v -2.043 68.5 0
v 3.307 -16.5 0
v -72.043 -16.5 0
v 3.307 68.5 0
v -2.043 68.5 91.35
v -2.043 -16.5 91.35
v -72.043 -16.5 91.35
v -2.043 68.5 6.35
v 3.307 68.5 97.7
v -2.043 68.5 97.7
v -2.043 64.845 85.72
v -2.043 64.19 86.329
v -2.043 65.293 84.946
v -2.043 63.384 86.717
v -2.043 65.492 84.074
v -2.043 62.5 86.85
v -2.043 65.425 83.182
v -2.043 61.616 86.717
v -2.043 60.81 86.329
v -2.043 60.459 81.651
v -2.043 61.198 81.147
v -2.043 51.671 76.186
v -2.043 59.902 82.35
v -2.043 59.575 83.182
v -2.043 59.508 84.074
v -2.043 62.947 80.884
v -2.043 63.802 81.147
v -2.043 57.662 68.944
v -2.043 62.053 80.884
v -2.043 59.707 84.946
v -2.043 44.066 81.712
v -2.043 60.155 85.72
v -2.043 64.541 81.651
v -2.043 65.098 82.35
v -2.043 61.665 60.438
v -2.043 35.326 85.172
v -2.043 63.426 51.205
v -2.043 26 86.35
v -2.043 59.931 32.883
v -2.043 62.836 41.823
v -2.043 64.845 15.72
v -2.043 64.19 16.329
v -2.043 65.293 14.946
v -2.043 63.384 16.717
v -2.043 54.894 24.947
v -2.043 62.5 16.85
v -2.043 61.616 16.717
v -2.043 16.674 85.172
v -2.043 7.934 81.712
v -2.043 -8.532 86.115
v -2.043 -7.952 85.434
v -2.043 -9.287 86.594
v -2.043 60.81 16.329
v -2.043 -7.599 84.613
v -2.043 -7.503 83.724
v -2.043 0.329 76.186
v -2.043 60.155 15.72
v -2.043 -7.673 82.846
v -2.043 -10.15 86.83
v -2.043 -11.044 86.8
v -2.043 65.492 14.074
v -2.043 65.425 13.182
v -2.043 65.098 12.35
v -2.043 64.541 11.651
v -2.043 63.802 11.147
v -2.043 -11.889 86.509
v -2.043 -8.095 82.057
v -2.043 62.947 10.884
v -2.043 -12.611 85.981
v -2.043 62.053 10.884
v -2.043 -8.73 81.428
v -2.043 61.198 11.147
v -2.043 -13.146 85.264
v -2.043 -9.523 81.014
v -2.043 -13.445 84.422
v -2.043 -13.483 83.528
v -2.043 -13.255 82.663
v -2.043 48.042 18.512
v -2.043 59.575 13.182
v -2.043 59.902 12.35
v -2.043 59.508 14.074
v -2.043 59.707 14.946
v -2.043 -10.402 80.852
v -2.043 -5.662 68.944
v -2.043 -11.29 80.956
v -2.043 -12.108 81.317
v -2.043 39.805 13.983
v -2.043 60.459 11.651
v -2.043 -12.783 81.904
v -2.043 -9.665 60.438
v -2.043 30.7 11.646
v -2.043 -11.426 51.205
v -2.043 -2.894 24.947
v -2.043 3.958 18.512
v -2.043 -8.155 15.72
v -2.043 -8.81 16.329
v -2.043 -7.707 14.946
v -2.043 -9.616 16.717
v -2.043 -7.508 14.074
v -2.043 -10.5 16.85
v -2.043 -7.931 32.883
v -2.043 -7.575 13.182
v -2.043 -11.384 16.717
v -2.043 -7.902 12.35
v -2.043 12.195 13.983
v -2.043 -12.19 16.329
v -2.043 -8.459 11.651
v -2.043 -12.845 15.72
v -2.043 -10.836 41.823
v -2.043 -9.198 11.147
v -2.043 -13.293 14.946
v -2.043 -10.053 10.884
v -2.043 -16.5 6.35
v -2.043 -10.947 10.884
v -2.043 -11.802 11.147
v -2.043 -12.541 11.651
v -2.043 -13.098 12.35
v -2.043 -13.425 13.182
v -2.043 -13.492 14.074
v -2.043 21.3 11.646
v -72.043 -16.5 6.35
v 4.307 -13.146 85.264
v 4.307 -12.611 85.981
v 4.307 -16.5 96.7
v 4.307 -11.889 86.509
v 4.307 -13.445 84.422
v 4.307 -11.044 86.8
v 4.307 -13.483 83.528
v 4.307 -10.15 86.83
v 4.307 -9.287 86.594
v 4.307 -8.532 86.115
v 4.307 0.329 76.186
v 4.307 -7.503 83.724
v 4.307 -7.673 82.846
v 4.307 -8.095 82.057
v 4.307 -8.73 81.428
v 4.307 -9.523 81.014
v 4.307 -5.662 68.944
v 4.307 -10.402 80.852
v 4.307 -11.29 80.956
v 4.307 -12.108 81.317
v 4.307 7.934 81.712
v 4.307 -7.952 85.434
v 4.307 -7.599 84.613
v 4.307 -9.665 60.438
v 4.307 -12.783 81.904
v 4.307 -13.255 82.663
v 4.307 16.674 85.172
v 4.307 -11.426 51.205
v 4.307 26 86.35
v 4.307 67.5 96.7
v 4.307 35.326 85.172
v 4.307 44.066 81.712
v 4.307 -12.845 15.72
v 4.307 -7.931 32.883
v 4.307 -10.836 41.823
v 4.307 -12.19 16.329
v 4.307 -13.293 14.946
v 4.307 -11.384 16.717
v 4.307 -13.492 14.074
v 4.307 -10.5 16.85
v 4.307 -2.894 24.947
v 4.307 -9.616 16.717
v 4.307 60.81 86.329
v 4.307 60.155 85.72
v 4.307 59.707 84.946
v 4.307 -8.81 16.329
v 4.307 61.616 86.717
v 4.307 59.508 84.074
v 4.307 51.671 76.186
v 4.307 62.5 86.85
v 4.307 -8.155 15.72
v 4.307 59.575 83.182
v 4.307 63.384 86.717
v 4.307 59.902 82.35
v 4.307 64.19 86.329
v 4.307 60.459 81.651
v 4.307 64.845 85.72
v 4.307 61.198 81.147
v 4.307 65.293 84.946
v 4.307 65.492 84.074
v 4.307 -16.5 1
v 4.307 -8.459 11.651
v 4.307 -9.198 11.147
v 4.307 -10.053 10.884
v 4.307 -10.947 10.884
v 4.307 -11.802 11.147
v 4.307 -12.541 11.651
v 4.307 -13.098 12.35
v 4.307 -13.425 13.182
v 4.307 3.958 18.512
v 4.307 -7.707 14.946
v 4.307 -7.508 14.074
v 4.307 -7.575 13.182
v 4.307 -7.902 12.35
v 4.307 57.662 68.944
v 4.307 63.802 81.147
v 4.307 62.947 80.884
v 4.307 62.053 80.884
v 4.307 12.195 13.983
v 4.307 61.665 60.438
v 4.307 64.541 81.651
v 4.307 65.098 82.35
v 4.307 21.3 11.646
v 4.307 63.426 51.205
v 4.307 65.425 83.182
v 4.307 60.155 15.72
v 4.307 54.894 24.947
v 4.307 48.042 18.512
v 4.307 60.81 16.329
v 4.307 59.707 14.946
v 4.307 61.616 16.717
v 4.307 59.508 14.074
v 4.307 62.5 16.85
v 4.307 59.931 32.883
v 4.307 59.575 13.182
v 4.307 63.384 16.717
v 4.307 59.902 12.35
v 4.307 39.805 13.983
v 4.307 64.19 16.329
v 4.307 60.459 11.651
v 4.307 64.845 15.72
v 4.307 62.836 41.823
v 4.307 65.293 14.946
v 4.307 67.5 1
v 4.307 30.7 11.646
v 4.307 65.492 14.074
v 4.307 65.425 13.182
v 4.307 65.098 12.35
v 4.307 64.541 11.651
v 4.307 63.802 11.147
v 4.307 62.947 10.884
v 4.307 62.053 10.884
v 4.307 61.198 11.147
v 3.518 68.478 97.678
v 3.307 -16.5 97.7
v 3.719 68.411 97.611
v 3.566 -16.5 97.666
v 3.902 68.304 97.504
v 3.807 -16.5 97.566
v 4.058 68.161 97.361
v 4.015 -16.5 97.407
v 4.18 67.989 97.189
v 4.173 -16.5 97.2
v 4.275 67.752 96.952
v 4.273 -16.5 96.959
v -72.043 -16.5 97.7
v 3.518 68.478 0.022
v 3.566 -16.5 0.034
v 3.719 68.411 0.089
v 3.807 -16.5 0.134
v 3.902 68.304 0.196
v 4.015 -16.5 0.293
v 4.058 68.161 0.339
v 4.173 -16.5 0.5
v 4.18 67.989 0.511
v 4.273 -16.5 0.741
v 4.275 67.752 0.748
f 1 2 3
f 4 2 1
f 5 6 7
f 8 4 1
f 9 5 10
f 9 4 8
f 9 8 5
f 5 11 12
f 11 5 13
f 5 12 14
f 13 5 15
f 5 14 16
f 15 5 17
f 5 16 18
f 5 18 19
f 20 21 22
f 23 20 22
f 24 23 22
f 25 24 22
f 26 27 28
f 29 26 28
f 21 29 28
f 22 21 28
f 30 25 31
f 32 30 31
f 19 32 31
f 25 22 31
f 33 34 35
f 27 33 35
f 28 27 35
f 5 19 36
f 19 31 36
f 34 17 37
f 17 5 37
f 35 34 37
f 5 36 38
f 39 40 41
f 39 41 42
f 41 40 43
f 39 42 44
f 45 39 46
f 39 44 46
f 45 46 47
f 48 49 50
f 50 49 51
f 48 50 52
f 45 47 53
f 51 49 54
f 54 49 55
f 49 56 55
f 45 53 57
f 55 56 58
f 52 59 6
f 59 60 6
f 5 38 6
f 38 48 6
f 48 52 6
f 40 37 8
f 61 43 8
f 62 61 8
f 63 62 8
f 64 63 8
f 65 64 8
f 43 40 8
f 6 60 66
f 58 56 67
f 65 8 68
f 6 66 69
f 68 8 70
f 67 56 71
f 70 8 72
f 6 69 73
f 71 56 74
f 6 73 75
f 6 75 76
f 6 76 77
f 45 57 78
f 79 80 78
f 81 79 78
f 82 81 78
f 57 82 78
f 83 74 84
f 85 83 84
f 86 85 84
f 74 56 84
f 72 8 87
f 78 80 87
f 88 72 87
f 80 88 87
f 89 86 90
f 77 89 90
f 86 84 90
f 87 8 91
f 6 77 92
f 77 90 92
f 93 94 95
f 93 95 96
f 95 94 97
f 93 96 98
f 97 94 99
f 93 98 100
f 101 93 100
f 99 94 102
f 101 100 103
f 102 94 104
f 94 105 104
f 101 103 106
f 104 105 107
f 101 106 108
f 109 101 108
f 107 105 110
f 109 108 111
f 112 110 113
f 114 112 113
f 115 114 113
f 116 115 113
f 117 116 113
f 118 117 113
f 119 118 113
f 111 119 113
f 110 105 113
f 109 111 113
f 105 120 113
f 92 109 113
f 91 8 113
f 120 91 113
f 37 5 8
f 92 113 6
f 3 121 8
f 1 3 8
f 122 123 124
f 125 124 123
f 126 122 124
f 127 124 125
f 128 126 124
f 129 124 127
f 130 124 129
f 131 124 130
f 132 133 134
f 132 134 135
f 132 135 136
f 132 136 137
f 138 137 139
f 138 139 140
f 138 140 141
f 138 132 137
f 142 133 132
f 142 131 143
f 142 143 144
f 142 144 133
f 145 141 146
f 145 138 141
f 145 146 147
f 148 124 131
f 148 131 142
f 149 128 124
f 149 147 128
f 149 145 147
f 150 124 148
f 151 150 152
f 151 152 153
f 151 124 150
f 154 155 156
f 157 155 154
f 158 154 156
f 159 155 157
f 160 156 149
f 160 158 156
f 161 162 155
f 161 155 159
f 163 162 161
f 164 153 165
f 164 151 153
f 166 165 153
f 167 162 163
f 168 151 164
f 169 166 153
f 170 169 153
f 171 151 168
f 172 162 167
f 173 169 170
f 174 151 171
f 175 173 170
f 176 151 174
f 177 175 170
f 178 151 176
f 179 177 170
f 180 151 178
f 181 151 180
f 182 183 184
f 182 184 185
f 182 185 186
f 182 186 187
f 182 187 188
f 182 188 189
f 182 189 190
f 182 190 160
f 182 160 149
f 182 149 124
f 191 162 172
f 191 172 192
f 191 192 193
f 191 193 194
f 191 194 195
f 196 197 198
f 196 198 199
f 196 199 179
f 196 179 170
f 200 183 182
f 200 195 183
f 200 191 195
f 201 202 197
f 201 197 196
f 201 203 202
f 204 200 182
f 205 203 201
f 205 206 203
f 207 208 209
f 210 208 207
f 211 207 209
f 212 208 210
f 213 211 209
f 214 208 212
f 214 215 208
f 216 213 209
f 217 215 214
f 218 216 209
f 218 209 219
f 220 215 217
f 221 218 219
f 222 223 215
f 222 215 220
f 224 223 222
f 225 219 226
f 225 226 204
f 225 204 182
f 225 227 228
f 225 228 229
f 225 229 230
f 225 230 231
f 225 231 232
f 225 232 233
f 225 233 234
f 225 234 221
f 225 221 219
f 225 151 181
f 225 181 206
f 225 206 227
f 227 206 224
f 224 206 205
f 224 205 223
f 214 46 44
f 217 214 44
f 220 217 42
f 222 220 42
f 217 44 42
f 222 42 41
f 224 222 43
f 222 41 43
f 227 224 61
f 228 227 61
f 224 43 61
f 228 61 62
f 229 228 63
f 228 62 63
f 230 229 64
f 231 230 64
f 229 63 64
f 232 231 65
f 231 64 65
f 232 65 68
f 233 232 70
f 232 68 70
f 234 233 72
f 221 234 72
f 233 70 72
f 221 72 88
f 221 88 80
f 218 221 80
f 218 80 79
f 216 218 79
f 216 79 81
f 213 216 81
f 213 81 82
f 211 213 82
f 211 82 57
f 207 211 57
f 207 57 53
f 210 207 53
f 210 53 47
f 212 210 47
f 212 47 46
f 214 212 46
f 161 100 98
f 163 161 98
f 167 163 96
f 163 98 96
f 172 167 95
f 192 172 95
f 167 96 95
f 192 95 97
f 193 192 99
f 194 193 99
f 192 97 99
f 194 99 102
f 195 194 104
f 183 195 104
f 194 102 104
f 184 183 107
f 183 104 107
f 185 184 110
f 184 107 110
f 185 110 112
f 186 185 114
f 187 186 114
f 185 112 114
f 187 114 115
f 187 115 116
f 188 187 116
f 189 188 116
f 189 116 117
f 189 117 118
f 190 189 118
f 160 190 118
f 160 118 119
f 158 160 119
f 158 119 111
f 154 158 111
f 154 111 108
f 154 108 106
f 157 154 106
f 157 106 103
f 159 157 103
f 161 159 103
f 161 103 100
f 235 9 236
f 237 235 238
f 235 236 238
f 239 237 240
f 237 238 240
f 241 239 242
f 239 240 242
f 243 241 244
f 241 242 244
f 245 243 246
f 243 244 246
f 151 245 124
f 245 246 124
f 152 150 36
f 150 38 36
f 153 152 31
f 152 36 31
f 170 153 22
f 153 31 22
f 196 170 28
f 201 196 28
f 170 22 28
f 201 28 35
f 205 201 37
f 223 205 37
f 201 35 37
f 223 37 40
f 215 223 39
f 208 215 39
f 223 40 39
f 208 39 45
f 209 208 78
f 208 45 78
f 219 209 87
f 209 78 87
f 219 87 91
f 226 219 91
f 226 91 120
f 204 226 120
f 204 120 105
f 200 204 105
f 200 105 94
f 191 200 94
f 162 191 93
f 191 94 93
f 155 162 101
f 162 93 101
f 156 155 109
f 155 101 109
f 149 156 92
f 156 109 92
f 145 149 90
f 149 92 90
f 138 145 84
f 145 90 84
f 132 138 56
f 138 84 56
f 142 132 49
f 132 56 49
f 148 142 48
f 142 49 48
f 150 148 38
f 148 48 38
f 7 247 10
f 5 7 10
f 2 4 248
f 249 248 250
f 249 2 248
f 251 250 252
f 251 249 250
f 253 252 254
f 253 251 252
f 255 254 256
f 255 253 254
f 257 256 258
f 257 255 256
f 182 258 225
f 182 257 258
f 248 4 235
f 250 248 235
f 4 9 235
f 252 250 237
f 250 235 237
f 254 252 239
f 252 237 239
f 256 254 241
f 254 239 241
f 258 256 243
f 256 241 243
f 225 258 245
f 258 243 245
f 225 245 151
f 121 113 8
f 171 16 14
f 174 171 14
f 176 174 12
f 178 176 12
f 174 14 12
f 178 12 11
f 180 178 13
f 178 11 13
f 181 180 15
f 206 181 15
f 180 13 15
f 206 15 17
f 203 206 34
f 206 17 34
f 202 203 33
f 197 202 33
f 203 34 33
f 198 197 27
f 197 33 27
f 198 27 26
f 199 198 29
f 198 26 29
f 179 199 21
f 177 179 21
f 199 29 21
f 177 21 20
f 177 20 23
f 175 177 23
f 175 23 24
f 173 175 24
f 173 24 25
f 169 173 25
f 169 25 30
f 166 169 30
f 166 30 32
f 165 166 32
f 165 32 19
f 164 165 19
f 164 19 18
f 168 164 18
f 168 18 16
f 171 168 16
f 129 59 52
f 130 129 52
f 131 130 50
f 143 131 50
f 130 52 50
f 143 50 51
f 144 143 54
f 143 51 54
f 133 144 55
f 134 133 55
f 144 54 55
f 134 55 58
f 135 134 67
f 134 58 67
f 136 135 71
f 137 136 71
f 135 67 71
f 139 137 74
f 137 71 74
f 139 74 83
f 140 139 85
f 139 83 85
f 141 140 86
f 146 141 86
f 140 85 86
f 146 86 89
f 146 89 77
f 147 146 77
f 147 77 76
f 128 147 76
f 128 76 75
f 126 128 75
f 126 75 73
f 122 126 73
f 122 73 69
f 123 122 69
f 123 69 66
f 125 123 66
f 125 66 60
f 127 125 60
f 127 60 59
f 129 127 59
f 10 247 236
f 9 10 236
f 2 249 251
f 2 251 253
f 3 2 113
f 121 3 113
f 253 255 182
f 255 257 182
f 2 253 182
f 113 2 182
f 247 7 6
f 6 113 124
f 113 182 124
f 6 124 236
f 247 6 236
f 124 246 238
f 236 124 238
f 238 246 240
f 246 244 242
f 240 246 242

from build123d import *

# Parameters (mm, degrees)
SALIENTE_EXTRUIR1_DEPTH = 97.7
CROQUIS2_W              = 6.35
CROQUIS2_H              = 85
SALIENTE_EXTRUIR2_DEPTH = 70
CORTAR_EXTRUIR1_DEPTH   = 120
CROQUIS4_R              = 37.5
CROQUIS4_R_2            = 3
CORTAR_EXTRUIR2_DEPTH   = 120
CROQUIS5_W              = 30
CROQUIS5_H              = 18.85
CORTAR_EXTRUIR3_DEPTH   = 120
REDONDEO1_R             = 1
CORTAR_EXTRUIR4_DEPTH   = 110


with BuildPart() as part:
    # Croquis1 → Saliente-Extruir1 (new body)
    with BuildSketch(Plane.XY):
        Polygon((34.307403189, -10.15), (4.307403189, -10.15), (4.307403189, 68.5), (-2.042596811, 68.5), (-2.042596811, -16.5), (34.307403189, -16.5), align=None)
    extrude(amount=SALIENTE_EXTRUIR1_DEPTH)

    # Croquis2 → Saliente-Extruir2 (add)
    with BuildSketch(Plane.ZY.offset(2.042596811)):
        with Locations((3.175, 26)):
            Rectangle(CROQUIS2_W, CROQUIS2_H)
        with Locations((94.525, 26)):
            Rectangle(CROQUIS2_W, CROQUIS2_H)
    extrude(amount=SALIENTE_EXTRUIR2_DEPTH)

    # Croquis3 → Cortar-Extruir1 (cut)
    with BuildSketch(Plane.XY.offset(97.7)):
        Polygon((-72.042596811, -16.5), (-2.042596811, 68.5), (-72.042596811, 68.5), align=None)
    extrude(amount=-CORTAR_EXTRUIR1_DEPTH, mode=Mode.SUBTRACT)

    # Croquis4 → Cortar-Extruir2 (cut)
    with BuildSketch(Plane.ZY.offset(2.042596811)):
        with Locations((48.85, 26)):
            Circle(CROQUIS4_R)
        with Locations((13.85, 62.5)):
            Circle(CROQUIS4_R_2)
        with Locations((13.85, -10.5)):
            Circle(CROQUIS4_R_2)
        with Locations(Location((83.85, -10.5, 0), (0, 0, 6.699765178))):
            Circle(CROQUIS4_R_2)
        with Locations((83.85, 62.5)):
            Circle(CROQUIS4_R_2)
    extrude(amount=-CORTAR_EXTRUIR2_DEPTH, mode=Mode.SUBTRACT)

    # Croquis5 → Cortar-Extruir3 (cut)
    with BuildSketch(Plane(origin=(0, -10.15, 0), x_dir=(1, 0, 0), z_dir=(0, 1, 0))):
        with Locations((19.307403189, -9.425)):
            Rectangle(CROQUIS5_W, CROQUIS5_H)
        with Locations((19.307403189, -88.275)):
            Rectangle(CROQUIS5_W, CROQUIS5_H)
    extrude(amount=-CORTAR_EXTRUIR3_DEPTH, mode=Mode.SUBTRACT)

    # Redondeo1
    redondeo1_edges = [part.edges().sort_by_distance(p)[0] for p in [
        (4.307403189, 68.5, 48.85),
        (4.307403189, -13.325, 18.85),
        (4.307403189, 26, 97.7),
        (4.307403189, -13.325, 78.85),
        (4.307403189, -10.15, 28.864333044),
        (4.307403189, 26, 0),
    ]]
    fillet(redondeo1_edges, radius=REDONDEO1_R)

    # Croquis6 → Cortar-Extruir4 (cut)
    with BuildSketch(Plane(origin=(0, 68.5, 0), x_dir=(1, 0, 0), z_dir=(0, 1, 0))):
        Polygon((4.307403189, -1), (83.921067856, -1), (83.921067856, -107.501215509), (4.307403189, -96.7), align=None)
    extrude(amount=-CORTAR_EXTRUIR4_DEPTH, mode=Mode.SUBTRACT)


solid = part.part
